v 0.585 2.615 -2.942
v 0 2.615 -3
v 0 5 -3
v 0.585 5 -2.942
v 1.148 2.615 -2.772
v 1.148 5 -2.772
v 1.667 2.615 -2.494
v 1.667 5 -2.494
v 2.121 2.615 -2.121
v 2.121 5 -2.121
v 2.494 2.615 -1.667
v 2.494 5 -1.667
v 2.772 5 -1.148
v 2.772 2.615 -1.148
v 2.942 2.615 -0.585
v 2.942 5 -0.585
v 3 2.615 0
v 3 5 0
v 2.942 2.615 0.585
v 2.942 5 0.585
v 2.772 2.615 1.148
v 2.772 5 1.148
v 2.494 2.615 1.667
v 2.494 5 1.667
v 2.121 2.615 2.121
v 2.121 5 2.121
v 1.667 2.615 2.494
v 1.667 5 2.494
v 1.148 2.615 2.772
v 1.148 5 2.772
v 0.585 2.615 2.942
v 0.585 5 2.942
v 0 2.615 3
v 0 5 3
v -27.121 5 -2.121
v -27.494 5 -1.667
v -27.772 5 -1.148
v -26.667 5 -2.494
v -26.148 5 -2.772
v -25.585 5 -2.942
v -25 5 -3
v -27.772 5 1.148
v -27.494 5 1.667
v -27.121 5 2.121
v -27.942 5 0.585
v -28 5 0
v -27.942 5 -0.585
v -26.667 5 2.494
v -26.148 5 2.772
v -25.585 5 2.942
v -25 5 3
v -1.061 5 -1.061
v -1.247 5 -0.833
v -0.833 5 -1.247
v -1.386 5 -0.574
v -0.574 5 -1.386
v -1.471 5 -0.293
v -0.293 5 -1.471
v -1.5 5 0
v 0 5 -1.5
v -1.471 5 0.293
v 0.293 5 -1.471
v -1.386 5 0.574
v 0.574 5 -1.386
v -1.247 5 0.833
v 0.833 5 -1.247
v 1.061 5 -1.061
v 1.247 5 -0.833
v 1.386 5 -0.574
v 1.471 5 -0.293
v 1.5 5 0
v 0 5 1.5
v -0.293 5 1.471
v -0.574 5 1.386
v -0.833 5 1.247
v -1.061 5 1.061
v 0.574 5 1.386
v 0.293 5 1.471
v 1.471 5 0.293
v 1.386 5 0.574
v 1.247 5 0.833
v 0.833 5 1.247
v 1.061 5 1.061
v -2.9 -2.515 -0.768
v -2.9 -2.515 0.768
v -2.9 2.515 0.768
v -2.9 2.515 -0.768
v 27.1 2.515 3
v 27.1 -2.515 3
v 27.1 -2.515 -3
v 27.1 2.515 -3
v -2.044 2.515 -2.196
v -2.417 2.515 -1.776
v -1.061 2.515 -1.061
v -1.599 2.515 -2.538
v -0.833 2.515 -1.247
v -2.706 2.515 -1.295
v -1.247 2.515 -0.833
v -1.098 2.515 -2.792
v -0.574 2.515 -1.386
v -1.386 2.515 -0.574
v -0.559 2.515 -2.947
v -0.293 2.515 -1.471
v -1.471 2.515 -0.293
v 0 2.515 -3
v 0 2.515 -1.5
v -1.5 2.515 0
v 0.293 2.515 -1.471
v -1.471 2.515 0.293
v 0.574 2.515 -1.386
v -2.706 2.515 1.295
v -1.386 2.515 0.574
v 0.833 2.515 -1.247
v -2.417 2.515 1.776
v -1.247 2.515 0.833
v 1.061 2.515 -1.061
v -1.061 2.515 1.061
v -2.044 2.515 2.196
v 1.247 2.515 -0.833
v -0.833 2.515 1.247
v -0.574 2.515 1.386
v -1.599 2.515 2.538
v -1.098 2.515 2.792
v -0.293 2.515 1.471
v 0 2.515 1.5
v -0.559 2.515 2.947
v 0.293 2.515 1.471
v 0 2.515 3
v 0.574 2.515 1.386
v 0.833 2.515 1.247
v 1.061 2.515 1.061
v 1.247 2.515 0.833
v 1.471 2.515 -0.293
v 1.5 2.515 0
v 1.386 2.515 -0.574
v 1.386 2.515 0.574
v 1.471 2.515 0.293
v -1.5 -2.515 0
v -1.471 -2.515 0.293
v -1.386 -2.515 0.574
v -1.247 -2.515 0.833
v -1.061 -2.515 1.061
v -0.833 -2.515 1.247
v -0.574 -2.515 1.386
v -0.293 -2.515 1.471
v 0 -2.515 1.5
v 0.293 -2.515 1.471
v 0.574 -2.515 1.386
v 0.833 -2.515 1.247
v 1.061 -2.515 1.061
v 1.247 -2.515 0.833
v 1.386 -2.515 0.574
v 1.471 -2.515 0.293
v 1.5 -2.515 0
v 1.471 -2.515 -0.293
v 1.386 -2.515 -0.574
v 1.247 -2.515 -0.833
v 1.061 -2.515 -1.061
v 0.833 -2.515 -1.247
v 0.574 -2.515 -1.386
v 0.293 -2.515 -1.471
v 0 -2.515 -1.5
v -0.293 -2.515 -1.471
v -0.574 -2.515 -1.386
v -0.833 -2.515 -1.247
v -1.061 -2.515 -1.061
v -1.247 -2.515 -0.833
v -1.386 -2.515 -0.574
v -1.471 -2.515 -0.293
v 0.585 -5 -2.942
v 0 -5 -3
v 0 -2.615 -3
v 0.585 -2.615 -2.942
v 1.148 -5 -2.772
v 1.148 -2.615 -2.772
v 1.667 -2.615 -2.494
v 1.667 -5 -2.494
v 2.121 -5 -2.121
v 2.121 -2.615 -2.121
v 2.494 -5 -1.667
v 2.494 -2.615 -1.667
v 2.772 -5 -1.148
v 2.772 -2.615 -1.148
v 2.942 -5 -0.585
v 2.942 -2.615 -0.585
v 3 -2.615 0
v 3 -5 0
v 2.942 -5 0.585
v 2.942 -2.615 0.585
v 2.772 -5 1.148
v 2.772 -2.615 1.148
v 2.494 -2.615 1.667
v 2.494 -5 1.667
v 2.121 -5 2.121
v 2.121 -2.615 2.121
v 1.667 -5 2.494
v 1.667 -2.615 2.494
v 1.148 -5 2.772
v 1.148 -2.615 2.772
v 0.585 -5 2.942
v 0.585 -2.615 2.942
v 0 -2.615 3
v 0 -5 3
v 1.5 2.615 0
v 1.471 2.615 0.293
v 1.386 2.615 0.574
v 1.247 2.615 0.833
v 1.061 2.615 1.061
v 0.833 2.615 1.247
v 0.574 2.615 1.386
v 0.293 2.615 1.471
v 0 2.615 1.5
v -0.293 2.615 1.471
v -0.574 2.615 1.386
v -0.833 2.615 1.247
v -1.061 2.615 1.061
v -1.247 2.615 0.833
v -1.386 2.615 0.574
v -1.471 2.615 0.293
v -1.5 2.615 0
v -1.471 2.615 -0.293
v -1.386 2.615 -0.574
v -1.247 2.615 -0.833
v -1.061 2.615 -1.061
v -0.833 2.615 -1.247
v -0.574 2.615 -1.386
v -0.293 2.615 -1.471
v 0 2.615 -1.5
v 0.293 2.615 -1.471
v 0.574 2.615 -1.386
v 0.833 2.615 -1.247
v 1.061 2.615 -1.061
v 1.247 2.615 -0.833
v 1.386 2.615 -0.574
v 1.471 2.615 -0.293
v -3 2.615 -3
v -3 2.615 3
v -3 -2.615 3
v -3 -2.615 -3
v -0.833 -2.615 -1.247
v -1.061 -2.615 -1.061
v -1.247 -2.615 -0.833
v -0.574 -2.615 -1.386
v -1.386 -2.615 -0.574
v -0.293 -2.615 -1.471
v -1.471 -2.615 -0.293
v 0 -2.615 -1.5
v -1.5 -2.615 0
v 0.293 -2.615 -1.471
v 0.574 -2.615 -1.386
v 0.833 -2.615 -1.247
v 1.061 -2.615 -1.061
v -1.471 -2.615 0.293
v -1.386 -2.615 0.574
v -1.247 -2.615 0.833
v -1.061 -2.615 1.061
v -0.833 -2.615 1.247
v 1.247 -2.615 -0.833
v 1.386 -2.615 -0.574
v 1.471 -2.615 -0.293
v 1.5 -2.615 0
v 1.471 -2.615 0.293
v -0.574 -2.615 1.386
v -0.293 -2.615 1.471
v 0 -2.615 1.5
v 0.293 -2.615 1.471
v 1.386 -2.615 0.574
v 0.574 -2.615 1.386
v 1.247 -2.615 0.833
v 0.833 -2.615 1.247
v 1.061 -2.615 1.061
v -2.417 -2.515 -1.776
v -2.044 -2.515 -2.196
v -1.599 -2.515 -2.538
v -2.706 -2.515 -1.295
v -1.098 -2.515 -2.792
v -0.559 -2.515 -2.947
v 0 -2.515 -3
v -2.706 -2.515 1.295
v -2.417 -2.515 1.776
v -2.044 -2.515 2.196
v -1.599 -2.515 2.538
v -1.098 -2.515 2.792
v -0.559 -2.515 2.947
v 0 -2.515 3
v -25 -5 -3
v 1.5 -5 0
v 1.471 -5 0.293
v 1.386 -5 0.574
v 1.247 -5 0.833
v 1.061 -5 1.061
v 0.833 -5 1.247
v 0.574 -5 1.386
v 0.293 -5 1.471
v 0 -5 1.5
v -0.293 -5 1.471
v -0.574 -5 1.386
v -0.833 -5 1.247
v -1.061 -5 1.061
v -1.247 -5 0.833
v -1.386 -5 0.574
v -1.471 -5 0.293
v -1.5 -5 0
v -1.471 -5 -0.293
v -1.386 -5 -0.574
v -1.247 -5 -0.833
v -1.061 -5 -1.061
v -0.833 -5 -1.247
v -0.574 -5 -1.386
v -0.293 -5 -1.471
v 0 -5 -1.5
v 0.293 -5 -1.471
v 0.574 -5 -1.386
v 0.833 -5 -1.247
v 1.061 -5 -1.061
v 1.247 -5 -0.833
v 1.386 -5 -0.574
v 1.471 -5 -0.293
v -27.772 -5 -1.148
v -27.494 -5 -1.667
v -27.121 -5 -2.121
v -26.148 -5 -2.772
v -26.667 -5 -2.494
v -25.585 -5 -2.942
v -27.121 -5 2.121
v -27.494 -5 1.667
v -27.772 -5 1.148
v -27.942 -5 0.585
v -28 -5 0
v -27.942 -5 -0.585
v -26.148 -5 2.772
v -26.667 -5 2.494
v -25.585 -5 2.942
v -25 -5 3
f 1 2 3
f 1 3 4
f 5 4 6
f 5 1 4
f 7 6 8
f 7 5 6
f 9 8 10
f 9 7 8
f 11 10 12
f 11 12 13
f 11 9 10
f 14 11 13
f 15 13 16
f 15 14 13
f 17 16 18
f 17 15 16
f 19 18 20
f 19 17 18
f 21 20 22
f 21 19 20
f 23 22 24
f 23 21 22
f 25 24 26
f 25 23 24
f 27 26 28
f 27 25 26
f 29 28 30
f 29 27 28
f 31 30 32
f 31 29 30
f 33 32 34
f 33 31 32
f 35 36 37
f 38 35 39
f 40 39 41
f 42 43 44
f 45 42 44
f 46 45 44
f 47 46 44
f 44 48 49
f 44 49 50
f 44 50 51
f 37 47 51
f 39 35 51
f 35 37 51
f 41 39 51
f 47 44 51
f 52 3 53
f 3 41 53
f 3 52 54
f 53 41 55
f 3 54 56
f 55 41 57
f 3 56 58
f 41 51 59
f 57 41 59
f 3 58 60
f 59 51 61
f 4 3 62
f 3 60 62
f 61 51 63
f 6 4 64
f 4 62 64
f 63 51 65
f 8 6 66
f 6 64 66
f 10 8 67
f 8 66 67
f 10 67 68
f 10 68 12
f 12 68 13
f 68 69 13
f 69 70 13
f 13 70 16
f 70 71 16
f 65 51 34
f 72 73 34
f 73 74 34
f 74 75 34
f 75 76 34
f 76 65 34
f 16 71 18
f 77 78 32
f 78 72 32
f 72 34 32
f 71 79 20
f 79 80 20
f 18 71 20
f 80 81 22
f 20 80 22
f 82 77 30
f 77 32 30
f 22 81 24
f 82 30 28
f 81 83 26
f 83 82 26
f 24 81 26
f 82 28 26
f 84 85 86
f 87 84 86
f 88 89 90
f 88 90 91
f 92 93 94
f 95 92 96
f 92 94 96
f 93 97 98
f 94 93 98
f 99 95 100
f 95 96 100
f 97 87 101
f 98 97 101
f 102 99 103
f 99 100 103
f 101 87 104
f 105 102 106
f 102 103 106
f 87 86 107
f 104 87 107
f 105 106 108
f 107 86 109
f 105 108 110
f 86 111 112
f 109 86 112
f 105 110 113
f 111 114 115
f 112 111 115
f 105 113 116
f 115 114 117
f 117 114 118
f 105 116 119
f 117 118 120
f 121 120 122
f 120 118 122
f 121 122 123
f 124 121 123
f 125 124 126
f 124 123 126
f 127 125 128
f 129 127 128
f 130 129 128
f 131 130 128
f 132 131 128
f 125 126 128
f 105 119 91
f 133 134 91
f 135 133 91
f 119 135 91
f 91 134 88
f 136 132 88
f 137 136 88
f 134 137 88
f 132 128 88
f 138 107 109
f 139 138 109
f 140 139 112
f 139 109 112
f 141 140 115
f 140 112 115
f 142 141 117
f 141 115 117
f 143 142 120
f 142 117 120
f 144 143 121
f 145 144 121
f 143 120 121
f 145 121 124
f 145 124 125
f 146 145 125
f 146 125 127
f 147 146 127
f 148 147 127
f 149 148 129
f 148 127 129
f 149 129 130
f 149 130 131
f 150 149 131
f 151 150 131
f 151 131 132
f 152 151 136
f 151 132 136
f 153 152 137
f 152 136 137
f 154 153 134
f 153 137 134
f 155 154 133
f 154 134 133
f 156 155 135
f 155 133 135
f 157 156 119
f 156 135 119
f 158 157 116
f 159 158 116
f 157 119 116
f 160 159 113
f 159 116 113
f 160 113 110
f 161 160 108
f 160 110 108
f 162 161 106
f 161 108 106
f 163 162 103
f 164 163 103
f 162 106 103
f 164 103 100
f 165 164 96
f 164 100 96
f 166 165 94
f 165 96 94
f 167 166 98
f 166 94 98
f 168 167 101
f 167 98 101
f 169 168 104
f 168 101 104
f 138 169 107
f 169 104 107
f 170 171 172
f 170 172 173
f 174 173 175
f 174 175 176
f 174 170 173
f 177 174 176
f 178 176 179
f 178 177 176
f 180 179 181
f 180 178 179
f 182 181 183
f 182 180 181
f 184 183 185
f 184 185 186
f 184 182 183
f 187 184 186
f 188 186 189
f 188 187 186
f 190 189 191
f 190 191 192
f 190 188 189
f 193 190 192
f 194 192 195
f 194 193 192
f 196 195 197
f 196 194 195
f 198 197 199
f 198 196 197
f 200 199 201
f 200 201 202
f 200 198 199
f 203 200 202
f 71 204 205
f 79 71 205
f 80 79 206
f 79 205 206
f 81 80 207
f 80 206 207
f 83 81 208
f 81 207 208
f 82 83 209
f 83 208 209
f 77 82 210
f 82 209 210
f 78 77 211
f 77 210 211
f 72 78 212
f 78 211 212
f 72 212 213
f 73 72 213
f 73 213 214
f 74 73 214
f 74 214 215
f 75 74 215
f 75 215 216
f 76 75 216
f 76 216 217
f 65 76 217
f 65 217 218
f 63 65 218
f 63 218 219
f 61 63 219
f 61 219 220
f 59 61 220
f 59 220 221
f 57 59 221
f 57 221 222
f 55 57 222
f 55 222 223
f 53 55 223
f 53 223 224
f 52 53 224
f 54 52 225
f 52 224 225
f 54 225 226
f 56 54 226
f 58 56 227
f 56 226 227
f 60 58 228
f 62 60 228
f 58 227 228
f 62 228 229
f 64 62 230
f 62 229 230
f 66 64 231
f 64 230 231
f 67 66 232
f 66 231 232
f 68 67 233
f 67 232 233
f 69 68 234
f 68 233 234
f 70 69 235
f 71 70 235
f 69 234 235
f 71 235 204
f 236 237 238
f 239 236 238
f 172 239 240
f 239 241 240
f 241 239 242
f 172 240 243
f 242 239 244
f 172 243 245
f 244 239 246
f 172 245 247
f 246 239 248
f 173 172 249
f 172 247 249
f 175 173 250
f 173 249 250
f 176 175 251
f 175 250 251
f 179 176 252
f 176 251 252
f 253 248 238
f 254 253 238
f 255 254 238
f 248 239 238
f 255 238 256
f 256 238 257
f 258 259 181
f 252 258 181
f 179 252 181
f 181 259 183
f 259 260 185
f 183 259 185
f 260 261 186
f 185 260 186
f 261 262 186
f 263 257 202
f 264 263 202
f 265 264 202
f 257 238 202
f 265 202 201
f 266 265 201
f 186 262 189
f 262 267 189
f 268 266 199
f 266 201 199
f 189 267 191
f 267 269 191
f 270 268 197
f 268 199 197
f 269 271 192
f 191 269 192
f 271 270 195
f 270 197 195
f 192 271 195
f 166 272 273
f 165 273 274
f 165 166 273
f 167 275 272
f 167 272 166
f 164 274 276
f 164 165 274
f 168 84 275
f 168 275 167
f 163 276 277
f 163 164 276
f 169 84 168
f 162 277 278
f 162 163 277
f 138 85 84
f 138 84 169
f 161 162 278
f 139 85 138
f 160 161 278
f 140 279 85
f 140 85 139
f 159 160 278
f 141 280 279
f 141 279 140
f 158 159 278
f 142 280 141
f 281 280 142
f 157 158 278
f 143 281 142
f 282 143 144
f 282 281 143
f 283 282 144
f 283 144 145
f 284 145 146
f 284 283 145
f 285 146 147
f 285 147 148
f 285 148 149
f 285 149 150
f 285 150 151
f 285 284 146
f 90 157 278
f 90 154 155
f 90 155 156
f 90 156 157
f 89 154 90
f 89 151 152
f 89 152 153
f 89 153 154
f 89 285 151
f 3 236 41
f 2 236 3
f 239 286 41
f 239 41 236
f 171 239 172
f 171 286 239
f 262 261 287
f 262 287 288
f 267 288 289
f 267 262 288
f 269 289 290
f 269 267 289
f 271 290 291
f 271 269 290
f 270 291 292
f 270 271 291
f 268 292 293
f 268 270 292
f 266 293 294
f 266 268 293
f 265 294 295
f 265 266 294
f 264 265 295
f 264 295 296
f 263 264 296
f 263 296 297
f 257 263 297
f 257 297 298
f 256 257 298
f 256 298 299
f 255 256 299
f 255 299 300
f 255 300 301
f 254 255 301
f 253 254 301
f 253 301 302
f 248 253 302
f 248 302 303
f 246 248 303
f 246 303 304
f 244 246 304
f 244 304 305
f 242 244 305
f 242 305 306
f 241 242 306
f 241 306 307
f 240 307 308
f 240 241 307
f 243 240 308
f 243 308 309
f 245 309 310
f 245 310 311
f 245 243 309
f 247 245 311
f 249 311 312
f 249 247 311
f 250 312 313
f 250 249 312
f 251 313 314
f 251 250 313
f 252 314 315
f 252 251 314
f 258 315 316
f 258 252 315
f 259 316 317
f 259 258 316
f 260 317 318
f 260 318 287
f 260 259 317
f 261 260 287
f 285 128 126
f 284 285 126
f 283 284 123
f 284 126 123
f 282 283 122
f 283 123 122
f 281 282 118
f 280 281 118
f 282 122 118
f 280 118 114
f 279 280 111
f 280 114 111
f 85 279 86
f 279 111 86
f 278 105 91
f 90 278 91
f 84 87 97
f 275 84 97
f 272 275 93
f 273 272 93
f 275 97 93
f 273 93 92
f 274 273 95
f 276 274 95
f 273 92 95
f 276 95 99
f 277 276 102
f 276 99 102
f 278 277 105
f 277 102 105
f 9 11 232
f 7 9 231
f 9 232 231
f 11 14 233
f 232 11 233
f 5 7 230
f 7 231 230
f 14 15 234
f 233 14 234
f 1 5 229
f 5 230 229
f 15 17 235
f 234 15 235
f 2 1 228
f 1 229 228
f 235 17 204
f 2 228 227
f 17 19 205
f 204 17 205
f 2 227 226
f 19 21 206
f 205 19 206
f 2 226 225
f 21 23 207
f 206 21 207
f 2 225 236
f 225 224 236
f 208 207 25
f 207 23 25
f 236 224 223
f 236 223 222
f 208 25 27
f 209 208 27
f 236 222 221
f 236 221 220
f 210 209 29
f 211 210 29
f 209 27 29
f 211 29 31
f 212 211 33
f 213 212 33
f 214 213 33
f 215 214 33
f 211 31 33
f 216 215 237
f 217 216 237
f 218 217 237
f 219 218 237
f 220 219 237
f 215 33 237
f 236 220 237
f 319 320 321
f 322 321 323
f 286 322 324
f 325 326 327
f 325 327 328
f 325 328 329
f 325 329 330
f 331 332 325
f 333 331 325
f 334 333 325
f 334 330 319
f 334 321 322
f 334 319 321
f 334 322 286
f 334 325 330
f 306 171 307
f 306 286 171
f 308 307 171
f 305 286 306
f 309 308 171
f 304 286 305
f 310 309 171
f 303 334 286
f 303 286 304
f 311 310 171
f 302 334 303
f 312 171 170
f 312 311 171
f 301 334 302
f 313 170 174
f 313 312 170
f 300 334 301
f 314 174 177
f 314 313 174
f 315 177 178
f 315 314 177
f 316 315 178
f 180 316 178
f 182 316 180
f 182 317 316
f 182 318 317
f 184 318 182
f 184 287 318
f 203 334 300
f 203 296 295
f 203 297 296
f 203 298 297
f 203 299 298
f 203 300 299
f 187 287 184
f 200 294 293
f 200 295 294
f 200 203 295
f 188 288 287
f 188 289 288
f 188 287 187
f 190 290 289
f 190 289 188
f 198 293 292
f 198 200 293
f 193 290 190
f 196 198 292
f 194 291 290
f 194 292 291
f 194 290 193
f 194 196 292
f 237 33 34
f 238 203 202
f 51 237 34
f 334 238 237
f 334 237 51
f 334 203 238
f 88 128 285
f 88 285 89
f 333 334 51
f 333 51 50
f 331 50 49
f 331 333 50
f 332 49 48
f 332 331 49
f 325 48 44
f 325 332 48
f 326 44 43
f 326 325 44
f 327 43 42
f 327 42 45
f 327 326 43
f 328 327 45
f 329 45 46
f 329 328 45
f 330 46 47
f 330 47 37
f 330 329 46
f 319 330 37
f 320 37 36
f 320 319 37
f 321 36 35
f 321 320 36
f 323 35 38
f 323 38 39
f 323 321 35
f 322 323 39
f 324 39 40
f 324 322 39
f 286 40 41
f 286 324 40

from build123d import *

# Parameters (mm, degrees)
F0_R          = 1.5
F1_DEPTH      = 5
F1_DEPTH_BACK = 5
F2_W          = 3
F2_H          = 5.229874
F3_DEPTH      = 25
F4_W          = 30
F4_H          = 5.029874
F5_DEPTH      = 6
F6_R          = 1.5
F7_DEPTH      = 5.029874


with BuildPart() as f1:
    # F0 (on Front) → F1 (new body, two sides)
    with BuildSketch(Plane.XZ) as f1_sk:
        with BuildLine():
            ThreePointArc((0, -3), (3, 0), (0, 3))
            Line((0, 3), (-25, 3))
            ThreePointArc((-25, 3), (-28, 0), (-25, -3))
            Line((-25, -3), (0, -3))
        make_face()
        Circle(F0_R, mode=Mode.SUBTRACT)
    extrude(amount=F1_DEPTH)
    extrude(f1_sk.sketch, amount=-F1_DEPTH_BACK)

    # F2 (on face) → F3 (cut)
    with BuildSketch(Plane.XY.offset(3)):
        Polygon((0, -2.614937), (0, 2.614937), (-3, 2.614937), (-3, 0), (-3, -2.614937), align=None)
        with Locations((1.5, 0)):
            Rectangle(F2_W, F2_H)
    extrude(amount=-F3_DEPTH, mode=Mode.SUBTRACT)


with BuildPart() as f5:
    # F4 (on face) → F5 (new body, through all)
    with BuildSketch(Plane.XY.offset(3)):
        with Locations((12.1, 0)):
            Rectangle(F4_W, F4_H)
    extrude(amount=-F5_DEPTH)

    # F6 (on face) → F7 (cut, through all)
    with BuildSketch(Plane(origin=(0, 2.514937, 0), x_dir=(-1, 0, 0), z_dir=(0, 1, 0))):
        Circle(F6_R)
        with BuildLine():
            Line((2.9, 3), (0, 3))
            ThreePointArc((0, 3), (1.829707, 2.37743), (2.9, 0.768115))
            Line((2.9, 0.768115), (2.9, 3))
        make_face()
        with BuildLine():
            Line((2.9, -3), (2.9, -0.768115))
            ThreePointArc((2.9, -0.768115), (1.829707, -2.37743), (0, -3))
            Line((0, -3), (2.9, -3))
        make_face()
    extrude(amount=-F7_DEPTH, mode=Mode.SUBTRACT)


solid = Compound([f1.part, f5.part])
